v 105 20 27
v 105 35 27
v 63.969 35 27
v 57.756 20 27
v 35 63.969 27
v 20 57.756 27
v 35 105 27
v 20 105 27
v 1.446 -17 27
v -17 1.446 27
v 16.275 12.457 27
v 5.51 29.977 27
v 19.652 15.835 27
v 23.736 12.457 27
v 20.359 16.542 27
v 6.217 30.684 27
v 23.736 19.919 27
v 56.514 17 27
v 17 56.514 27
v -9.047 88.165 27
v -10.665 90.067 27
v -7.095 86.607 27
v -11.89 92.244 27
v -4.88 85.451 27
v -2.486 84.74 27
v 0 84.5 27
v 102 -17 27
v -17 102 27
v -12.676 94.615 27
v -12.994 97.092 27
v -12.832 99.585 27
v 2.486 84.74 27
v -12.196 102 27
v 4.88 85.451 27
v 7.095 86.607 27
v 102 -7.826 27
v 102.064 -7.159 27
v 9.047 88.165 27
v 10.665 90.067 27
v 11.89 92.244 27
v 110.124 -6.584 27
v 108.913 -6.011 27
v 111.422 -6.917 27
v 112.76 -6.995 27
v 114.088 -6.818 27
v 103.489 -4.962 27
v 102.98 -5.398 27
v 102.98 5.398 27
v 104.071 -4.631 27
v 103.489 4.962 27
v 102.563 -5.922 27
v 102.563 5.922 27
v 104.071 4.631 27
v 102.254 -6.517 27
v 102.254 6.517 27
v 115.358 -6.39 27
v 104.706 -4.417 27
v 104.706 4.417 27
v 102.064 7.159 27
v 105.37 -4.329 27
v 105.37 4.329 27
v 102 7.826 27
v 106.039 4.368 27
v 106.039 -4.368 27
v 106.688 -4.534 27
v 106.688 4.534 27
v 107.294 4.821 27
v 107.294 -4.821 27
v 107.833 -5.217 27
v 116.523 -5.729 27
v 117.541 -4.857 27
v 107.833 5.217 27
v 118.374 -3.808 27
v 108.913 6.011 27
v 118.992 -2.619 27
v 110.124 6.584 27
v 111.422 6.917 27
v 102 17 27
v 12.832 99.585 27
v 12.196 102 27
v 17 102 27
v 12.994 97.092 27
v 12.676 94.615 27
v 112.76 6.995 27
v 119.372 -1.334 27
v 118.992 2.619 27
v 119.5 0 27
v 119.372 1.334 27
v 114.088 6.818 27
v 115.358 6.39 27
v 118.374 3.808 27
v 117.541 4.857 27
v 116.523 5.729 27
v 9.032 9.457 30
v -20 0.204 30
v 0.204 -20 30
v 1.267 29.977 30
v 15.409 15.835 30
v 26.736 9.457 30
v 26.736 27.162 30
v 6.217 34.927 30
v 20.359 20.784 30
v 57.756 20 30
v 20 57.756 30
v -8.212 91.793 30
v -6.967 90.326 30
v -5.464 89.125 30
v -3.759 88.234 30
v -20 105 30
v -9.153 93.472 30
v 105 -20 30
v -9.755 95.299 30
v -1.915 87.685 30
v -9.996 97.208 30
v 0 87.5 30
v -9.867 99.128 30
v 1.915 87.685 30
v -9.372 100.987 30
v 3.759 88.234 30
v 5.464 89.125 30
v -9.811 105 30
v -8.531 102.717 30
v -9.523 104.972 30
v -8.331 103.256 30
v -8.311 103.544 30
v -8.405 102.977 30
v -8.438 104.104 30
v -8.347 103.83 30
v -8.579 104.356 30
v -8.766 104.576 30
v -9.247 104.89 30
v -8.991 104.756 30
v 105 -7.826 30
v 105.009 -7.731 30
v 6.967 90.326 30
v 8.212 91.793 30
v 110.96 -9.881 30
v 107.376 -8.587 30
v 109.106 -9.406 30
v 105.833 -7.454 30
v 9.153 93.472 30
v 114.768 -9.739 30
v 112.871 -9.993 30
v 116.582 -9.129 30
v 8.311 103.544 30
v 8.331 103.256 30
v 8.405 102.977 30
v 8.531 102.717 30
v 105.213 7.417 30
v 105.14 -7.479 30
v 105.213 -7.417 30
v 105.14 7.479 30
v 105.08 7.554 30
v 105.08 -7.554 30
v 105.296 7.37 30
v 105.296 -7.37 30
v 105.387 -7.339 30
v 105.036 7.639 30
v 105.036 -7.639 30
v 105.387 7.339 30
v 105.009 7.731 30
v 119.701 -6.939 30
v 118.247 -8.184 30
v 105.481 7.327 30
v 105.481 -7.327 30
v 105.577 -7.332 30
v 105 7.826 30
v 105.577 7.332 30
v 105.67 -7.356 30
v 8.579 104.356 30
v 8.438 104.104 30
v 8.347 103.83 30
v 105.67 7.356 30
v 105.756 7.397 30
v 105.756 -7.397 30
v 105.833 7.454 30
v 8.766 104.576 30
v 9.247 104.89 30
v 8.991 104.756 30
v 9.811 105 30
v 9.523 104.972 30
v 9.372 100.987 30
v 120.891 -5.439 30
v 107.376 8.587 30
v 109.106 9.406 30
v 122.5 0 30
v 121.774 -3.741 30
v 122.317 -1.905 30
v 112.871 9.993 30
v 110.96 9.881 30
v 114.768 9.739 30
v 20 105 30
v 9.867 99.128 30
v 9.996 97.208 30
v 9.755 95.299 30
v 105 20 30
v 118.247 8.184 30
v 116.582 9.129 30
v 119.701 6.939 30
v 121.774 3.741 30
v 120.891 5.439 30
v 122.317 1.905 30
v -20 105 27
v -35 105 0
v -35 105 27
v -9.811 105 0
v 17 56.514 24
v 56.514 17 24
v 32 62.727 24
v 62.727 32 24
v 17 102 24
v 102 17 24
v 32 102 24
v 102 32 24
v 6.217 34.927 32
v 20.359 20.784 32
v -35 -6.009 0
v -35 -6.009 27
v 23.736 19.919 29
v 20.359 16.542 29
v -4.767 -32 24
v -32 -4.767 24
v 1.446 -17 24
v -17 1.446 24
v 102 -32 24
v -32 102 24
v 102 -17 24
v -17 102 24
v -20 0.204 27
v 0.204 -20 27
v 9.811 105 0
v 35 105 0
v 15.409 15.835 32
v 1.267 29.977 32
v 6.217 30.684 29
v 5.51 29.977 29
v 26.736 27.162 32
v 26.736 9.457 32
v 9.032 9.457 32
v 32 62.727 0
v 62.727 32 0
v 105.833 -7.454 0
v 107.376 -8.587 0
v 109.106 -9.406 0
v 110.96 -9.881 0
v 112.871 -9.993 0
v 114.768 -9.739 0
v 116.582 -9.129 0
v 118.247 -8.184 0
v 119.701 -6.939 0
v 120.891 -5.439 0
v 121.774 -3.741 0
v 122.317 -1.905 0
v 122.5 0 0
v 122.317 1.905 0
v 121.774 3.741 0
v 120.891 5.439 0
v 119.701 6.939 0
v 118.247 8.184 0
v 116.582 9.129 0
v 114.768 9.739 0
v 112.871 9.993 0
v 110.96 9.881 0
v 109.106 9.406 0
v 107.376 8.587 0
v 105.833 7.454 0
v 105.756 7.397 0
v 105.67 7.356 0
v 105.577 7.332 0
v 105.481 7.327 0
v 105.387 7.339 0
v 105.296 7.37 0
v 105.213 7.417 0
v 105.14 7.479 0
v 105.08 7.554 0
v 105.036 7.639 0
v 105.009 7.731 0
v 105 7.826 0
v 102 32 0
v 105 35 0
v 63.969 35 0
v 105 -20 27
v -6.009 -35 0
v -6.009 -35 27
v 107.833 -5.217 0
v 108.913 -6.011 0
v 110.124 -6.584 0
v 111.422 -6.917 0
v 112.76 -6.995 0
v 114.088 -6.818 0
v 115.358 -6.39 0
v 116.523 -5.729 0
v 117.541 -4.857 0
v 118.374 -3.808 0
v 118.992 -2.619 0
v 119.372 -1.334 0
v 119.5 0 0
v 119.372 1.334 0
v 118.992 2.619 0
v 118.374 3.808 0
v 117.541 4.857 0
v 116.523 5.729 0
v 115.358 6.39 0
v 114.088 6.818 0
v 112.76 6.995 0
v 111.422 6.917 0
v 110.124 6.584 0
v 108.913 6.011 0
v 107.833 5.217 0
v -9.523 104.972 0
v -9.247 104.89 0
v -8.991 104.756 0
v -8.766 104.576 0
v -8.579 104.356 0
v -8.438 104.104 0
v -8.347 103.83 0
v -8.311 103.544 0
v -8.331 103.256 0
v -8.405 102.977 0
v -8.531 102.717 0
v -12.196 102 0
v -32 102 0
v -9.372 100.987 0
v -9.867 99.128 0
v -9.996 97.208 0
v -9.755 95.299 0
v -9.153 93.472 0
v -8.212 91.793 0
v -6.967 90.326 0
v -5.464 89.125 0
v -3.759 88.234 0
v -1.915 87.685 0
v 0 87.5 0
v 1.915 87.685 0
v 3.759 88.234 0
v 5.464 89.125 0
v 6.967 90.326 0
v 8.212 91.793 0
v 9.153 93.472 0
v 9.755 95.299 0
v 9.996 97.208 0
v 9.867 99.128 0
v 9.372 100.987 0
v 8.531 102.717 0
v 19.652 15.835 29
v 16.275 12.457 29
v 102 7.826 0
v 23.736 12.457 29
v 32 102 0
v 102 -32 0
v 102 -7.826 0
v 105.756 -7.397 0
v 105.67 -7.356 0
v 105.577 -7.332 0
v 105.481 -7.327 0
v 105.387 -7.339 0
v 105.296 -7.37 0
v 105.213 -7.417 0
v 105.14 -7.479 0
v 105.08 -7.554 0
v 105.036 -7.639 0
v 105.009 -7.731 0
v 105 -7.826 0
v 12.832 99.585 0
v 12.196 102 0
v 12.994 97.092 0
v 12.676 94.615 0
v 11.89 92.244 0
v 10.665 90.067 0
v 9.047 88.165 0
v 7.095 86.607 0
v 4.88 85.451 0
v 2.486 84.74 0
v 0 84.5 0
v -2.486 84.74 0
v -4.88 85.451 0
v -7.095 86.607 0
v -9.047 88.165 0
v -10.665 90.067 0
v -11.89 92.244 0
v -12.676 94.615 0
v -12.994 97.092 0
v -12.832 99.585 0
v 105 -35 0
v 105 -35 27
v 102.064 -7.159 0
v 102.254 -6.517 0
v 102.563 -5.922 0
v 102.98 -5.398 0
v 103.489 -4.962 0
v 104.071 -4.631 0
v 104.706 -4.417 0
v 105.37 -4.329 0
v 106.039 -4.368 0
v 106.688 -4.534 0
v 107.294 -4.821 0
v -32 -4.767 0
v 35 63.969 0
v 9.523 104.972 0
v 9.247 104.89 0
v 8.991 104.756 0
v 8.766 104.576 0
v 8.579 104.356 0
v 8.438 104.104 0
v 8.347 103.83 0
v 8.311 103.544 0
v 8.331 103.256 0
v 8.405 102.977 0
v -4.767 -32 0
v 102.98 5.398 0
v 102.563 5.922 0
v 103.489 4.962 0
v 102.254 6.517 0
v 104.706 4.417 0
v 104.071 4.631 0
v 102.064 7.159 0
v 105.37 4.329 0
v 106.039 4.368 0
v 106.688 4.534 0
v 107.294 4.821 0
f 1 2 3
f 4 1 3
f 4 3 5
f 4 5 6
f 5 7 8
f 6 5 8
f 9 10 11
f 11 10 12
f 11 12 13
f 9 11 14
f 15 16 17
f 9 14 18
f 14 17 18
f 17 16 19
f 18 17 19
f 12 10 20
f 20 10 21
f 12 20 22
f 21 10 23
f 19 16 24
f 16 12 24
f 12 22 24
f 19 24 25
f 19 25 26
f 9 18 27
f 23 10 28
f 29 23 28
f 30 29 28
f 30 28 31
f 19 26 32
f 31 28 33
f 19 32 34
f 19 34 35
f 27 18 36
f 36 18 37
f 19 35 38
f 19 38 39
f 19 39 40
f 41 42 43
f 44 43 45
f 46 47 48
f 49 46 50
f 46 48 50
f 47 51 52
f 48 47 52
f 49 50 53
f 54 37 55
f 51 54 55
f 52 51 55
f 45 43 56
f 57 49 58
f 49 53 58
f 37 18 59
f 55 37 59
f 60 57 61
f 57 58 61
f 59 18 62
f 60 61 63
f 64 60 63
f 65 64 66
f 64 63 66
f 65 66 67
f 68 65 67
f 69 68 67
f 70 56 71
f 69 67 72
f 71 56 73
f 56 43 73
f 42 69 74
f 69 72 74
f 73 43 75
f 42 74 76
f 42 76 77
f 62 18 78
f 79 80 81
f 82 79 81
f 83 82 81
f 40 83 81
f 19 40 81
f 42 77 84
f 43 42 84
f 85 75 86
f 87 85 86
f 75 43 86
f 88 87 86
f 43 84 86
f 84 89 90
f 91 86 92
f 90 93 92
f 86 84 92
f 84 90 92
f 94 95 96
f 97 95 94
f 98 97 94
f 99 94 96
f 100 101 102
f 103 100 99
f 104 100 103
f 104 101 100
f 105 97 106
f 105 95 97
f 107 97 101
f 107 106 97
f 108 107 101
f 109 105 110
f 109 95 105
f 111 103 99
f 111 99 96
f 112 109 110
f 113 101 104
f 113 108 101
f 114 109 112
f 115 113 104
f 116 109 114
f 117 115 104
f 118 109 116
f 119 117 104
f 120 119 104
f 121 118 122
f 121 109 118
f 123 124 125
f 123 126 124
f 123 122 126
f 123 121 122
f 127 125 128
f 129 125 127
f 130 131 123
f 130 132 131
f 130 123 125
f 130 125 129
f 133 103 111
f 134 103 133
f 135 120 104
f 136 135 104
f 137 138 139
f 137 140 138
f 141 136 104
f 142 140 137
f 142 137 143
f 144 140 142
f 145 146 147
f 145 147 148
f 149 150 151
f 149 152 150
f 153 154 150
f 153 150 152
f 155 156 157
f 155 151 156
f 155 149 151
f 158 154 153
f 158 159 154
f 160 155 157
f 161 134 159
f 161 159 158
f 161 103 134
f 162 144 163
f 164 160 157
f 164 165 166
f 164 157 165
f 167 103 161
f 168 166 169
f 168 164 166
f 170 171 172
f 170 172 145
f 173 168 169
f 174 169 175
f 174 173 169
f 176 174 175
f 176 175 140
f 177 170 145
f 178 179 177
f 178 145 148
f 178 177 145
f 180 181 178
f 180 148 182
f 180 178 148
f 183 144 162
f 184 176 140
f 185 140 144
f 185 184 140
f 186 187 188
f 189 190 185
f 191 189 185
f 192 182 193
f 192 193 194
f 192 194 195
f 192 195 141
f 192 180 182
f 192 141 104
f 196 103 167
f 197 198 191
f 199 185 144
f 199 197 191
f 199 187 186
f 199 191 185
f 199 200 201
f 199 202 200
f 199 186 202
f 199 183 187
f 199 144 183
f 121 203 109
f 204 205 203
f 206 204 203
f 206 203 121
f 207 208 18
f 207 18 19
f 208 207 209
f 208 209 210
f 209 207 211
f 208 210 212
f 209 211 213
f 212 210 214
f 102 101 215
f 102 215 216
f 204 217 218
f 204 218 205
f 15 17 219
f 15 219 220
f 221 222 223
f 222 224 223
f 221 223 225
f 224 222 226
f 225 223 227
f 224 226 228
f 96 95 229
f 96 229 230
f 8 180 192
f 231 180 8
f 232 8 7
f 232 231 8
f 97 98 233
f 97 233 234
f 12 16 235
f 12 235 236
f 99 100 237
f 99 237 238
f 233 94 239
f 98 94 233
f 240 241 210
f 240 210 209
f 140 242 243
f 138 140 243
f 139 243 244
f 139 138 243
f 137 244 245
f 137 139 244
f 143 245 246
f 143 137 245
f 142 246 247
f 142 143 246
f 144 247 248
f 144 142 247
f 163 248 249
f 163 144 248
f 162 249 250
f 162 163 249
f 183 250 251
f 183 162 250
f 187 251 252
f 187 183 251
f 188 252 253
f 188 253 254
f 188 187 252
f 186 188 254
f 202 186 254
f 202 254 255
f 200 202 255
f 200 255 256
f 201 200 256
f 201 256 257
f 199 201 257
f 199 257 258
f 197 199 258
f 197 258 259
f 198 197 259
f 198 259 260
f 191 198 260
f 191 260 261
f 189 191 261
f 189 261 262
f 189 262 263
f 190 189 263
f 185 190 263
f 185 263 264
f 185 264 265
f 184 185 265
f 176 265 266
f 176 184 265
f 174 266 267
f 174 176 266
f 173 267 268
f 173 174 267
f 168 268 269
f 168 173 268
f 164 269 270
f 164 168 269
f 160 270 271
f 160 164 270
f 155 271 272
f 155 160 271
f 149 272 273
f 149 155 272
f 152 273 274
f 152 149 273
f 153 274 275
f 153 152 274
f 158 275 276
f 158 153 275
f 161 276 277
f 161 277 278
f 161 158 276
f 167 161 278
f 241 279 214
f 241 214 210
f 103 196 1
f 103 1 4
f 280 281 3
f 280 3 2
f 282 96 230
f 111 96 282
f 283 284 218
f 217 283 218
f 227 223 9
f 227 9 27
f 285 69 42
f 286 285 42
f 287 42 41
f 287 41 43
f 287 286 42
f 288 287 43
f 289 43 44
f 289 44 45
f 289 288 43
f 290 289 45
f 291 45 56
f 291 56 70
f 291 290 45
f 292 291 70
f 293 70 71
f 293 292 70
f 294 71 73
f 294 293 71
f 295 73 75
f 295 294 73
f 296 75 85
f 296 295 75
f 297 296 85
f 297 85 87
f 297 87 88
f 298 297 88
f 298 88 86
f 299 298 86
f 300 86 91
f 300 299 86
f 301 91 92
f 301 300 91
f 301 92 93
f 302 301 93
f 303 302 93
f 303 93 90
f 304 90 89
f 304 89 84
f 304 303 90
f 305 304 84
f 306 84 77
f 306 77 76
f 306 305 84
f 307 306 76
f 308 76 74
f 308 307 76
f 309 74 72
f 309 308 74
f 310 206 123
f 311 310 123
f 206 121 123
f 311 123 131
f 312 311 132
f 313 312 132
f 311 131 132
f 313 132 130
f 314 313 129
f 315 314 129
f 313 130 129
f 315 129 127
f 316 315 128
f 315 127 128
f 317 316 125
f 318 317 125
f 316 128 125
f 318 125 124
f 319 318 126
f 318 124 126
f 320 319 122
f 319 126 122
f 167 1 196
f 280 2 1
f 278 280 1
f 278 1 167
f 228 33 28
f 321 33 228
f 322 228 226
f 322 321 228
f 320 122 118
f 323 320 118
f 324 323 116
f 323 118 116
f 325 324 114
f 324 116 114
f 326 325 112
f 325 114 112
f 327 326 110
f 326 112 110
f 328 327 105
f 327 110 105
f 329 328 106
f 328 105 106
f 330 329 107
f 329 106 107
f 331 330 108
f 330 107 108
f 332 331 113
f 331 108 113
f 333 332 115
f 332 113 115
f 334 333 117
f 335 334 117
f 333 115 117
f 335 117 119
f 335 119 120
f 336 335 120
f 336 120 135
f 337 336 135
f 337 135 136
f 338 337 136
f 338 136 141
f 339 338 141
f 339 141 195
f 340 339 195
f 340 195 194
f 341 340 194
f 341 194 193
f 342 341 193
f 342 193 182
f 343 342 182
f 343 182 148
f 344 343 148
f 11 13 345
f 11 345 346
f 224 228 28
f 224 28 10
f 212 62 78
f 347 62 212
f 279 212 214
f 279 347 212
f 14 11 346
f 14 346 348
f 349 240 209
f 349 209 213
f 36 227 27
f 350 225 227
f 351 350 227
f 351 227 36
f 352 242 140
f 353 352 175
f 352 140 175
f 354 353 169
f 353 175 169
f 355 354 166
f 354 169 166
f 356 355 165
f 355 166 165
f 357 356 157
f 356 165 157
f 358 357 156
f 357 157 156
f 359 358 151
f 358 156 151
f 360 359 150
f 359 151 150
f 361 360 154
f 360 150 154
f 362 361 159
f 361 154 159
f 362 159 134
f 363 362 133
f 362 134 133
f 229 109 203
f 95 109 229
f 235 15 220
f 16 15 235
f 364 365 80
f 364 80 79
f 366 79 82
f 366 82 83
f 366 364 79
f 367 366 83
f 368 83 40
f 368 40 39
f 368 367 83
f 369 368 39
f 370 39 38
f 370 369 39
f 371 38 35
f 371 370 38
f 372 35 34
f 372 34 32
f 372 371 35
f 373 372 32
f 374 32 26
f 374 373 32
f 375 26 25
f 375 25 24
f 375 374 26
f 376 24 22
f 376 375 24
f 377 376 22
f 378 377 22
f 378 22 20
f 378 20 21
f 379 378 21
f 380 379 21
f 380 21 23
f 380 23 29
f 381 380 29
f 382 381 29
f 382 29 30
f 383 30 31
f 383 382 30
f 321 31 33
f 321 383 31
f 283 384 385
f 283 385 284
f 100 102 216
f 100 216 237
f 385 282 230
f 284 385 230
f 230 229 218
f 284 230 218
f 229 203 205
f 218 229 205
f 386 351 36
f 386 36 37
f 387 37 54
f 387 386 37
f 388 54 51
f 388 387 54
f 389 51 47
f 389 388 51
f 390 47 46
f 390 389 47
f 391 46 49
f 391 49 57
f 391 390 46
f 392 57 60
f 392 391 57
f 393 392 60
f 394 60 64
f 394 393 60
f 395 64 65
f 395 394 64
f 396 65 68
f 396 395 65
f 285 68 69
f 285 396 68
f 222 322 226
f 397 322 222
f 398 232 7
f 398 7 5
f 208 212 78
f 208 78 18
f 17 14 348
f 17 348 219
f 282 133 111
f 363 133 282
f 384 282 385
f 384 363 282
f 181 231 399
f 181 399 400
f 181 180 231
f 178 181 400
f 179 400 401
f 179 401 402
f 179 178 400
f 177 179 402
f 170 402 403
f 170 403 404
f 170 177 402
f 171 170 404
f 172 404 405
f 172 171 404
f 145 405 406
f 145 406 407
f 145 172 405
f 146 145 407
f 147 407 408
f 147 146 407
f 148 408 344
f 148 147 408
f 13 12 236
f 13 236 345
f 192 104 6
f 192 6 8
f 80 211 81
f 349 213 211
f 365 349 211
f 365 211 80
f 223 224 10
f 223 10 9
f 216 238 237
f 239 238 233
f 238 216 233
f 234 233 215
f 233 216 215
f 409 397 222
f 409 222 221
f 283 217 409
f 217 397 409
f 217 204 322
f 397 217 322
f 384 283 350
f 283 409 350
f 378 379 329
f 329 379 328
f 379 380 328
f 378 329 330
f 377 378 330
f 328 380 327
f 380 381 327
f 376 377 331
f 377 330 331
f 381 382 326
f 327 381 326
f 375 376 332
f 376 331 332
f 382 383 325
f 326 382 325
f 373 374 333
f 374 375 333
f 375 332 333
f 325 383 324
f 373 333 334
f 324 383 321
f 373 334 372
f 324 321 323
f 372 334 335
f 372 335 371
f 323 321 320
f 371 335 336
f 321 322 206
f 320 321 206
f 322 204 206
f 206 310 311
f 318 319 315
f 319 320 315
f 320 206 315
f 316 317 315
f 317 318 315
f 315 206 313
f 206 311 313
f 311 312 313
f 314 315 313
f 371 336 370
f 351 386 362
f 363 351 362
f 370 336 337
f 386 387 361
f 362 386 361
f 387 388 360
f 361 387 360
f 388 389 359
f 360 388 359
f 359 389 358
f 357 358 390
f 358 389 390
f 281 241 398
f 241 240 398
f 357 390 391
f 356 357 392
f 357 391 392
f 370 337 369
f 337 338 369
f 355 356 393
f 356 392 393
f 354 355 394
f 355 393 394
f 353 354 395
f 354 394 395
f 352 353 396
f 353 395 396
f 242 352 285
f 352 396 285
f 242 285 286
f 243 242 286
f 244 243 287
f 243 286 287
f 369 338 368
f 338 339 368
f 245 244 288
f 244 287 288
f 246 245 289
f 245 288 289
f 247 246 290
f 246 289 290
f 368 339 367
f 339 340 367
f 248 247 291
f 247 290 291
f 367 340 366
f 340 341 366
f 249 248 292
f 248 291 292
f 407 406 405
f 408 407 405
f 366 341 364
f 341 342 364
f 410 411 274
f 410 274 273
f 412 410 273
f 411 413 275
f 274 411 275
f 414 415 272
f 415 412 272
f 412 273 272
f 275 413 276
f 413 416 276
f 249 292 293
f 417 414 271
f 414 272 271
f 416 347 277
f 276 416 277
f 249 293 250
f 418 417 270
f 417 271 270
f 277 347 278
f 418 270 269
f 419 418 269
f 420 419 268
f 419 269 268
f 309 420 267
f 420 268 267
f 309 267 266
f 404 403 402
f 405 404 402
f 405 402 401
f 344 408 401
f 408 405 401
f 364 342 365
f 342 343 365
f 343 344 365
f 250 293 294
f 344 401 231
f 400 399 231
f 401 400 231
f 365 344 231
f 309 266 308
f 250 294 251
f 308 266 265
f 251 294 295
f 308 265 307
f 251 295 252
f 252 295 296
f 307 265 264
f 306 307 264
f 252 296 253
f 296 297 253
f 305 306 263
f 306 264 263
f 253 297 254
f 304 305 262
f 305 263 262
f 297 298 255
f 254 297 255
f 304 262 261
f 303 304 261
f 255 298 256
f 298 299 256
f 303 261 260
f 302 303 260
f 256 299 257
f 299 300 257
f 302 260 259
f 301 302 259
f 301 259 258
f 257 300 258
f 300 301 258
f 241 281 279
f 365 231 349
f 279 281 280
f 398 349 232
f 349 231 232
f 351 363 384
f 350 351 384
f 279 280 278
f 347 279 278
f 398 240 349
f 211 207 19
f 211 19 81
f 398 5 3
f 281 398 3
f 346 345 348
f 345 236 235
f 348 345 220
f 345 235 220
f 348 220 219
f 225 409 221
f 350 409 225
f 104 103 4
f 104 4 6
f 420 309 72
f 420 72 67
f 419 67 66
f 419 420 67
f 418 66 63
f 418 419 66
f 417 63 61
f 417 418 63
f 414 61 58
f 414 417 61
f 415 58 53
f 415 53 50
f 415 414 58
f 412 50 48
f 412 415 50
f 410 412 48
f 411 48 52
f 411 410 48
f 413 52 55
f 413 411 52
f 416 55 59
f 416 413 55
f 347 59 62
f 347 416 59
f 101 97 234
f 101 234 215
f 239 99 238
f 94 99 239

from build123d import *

# Parameters (mm, degrees)
BOSS_EXTRU_1_DEPTH      = 30
BOSS_EXTRU_2_DEPTH      = 30
ENL_V_MAT_EXTRU_1_DEPTH = 152.492574075
ESQUISSE4_R             = 10
ENL_V_MAT_EXTRU_2_DEPTH = 50
ESQUISSE5_R             = 10
BOSS_EXTRU_3_DEPTH      = 30
ENL_V_MAT_EXTRU_3_DEPTH = 3
BOSS_EXTRU_4_DEPTH      = 2
CONG_2_R                = 0.5
CONG_3_R                = 1.5
COQUE1_DEPTH            = 24
COQUE1_START            = 24
COQUE1_2_DEPTH          = 3
COQUE1_START_2          = 27
COQUE1_3_DEPTH          = 2


# Read off the part's stored shape, not the designer's step: Coque1
with BuildPart() as part:
    # Esquisse1 → Boss.-Extru.1 (new body)
    with BuildSketch(Plane.XY):
        Polygon((-35, 105), (35, 105), (35, 35), (105, 35), (105, -35), (-35, -35), align=None)
    extrude(amount=BOSS_EXTRU_1_DEPTH)

    # Esquisse2 → Boss.-Extru.2 (add)
    with BuildSketch(Plane.XY.offset(30)):
        Polygon((35, 63.969429202), (63.969429202, 35), (35, 35), align=None)
    extrude(amount=-BOSS_EXTRU_2_DEPTH)

    # Esquisse3 → Enlèv. mat.-Extru.1 (cut, through all)
    with BuildSketch(Plane.XY.offset(30)):
        Polygon((-35, -35), (-6.009429202, -35), (-35, -6.009429202), align=None)
    extrude(amount=-ENL_V_MAT_EXTRU_1_DEPTH, mode=Mode.SUBTRACT)

    # Esquisse4 → Enlèv. mat.-Extru.2 (cut)
    with BuildSketch(Plane.XY.offset(30)):
        with Locations((0, 97.5)):
            Circle(ESQUISSE4_R)
    extrude(amount=-ENL_V_MAT_EXTRU_2_DEPTH, mode=Mode.SUBTRACT)

    # Esquisse5 → Boss.-Extru.3 (add, through all)
    with BuildSketch(Plane.XY.offset(30)):
        with Locations((112.5, 0)):
            Circle(ESQUISSE5_R)
    extrude(amount=-BOSS_EXTRU_3_DEPTH)

    # Esquisse7 → Enlèv. mat.-Extru.3 (cut)
    with BuildSketch(Plane.XY.offset(30)):
        Polygon((20, 57.756225766), (20, 105), (35, 105), (35, 63.969429202), (63.969429202, 35), (105, 35), (105, 20), (57.756225766, 20), align=None)
        Polygon((0.203774234, -20), (105, -20), (105, -35), (-6.009429202, -35), (-35, -6.009429202), (-35, 105), (-20, 105), (-20, 0.203774234), align=None)
    extrude(amount=-ENL_V_MAT_EXTRU_3_DEPTH, mode=Mode.SUBTRACT)

    # Esquisse8 → Boss.-Extru.4 (add)
    with BuildSketch(Plane.XY.offset(30)):
        Polygon((1.267051582, 29.97688251), (6.21679905, 34.926629979), (20.358934674, 20.784494355), (26.736260006, 27.161819687), (26.736260006, 9.457421554), (9.031861873, 9.457421554), (15.409187205, 15.834746887), align=None)
    extrude(amount=BOSS_EXTRU_4_DEPTH)

    # Congé2
    cong_2_edges = [part.edges().sort_by_distance(p)[0] for p in [
        (105, -6.614378278, 15),
        (105, 6.614378278, 15),
    ]]
    fillet(cong_2_edges, radius=CONG_2_R)

    # Congé3
    cong_3_edges = [part.edges().sort_by_distance(p)[0] for p in [
        (6.614378278, 105, 15),
        (-6.614378278, 105, 15),
    ]]
    fillet(cong_3_edges, radius=CONG_3_R)

    # Coque1 outline → Coque1 (cut)
    with BuildSketch(Plane.XY):
        with BuildLine():
            Line((-32, 102), (-32, -4.766788515))
            Line((-32, -4.766788515), (-4.766788515, -32))
            Line((-4.766788515, -32), (102, -32))
            Line((102, -32), (102, -7.826237921))
            ThreePointArc((102, -7.826237921), (104.071130983, -4.631189669), (107.833333333, -5.217491947))
            ThreePointArc((107.833333333, -5.217491947), (119.5, 0), (107.833333333, 5.217491947))
            ThreePointArc((107.833333333, 5.217491947), (104.071130983, 4.631189669), (102, 7.826237921))
            Line((102, 7.826237921), (102, 32))
            Line((102, 32), (62.726788515, 32))
            Line((62.726788515, 32), (32, 62.726788515))
            Line((32, 62.726788515), (32, 102))
            Line((32, 102), (12.196310918, 102))
            ThreePointArc((12.196310918, 102), (0, 84.5), (-12.196310918, 102))
            Line((-12.196310918, 102), (-32, 102))
        make_face()
    extrude(amount=COQUE1_DEPTH, mode=Mode.SUBTRACT)

    # Coque1 2 outline → Coque1 2 (cut)
    with BuildSketch(Plane.XY.offset(COQUE1_START)):
        with BuildLine():
            Line((-12.196310918, 102), (-17, 102))
            Line((-17, 102), (-17, 1.446414921))
            Line((-17, 1.446414921), (1.446414921, -17))
            Line((1.446414921, -17), (102, -17))
            Line((102, -17), (102, -7.826237921))
            ThreePointArc((102, -7.826237921), (104.071130983, -4.631189669), (107.833333333, -5.217491947))
            ThreePointArc((107.833333333, -5.217491947), (119.5, 0), (107.833333333, 5.217491947))
            ThreePointArc((107.833333333, 5.217491947), (104.071130983, 4.631189669), (102, 7.826237921))
            Line((102, 7.826237921), (102, 17))
            Line((102, 17), (56.513585079, 17))
            Line((56.513585079, 17), (17, 56.513585079))
            Line((17, 56.513585079), (17, 102))
            Line((17, 102), (12.196310918, 102))
            ThreePointArc((12.196310918, 102), (0, 84.5), (-12.196310918, 102))
        make_face()
    extrude(amount=COQUE1_2_DEPTH, mode=Mode.SUBTRACT)

    # Coque1 3 outline → Coque1 3 (cut)
    with BuildSketch(Plane.XY.offset(COQUE1_START_2)):
        Polygon((5.509692269, 29.97688251), (19.651827893, 15.834746887), (16.27450256, 12.457421554), (23.736260006, 12.457421554), (23.736260006, 19.919179), (20.358934674, 16.541853668), (6.21679905, 30.683989291), align=None)
    extrude(amount=COQUE1_3_DEPTH, mode=Mode.SUBTRACT)


solid = part.part
